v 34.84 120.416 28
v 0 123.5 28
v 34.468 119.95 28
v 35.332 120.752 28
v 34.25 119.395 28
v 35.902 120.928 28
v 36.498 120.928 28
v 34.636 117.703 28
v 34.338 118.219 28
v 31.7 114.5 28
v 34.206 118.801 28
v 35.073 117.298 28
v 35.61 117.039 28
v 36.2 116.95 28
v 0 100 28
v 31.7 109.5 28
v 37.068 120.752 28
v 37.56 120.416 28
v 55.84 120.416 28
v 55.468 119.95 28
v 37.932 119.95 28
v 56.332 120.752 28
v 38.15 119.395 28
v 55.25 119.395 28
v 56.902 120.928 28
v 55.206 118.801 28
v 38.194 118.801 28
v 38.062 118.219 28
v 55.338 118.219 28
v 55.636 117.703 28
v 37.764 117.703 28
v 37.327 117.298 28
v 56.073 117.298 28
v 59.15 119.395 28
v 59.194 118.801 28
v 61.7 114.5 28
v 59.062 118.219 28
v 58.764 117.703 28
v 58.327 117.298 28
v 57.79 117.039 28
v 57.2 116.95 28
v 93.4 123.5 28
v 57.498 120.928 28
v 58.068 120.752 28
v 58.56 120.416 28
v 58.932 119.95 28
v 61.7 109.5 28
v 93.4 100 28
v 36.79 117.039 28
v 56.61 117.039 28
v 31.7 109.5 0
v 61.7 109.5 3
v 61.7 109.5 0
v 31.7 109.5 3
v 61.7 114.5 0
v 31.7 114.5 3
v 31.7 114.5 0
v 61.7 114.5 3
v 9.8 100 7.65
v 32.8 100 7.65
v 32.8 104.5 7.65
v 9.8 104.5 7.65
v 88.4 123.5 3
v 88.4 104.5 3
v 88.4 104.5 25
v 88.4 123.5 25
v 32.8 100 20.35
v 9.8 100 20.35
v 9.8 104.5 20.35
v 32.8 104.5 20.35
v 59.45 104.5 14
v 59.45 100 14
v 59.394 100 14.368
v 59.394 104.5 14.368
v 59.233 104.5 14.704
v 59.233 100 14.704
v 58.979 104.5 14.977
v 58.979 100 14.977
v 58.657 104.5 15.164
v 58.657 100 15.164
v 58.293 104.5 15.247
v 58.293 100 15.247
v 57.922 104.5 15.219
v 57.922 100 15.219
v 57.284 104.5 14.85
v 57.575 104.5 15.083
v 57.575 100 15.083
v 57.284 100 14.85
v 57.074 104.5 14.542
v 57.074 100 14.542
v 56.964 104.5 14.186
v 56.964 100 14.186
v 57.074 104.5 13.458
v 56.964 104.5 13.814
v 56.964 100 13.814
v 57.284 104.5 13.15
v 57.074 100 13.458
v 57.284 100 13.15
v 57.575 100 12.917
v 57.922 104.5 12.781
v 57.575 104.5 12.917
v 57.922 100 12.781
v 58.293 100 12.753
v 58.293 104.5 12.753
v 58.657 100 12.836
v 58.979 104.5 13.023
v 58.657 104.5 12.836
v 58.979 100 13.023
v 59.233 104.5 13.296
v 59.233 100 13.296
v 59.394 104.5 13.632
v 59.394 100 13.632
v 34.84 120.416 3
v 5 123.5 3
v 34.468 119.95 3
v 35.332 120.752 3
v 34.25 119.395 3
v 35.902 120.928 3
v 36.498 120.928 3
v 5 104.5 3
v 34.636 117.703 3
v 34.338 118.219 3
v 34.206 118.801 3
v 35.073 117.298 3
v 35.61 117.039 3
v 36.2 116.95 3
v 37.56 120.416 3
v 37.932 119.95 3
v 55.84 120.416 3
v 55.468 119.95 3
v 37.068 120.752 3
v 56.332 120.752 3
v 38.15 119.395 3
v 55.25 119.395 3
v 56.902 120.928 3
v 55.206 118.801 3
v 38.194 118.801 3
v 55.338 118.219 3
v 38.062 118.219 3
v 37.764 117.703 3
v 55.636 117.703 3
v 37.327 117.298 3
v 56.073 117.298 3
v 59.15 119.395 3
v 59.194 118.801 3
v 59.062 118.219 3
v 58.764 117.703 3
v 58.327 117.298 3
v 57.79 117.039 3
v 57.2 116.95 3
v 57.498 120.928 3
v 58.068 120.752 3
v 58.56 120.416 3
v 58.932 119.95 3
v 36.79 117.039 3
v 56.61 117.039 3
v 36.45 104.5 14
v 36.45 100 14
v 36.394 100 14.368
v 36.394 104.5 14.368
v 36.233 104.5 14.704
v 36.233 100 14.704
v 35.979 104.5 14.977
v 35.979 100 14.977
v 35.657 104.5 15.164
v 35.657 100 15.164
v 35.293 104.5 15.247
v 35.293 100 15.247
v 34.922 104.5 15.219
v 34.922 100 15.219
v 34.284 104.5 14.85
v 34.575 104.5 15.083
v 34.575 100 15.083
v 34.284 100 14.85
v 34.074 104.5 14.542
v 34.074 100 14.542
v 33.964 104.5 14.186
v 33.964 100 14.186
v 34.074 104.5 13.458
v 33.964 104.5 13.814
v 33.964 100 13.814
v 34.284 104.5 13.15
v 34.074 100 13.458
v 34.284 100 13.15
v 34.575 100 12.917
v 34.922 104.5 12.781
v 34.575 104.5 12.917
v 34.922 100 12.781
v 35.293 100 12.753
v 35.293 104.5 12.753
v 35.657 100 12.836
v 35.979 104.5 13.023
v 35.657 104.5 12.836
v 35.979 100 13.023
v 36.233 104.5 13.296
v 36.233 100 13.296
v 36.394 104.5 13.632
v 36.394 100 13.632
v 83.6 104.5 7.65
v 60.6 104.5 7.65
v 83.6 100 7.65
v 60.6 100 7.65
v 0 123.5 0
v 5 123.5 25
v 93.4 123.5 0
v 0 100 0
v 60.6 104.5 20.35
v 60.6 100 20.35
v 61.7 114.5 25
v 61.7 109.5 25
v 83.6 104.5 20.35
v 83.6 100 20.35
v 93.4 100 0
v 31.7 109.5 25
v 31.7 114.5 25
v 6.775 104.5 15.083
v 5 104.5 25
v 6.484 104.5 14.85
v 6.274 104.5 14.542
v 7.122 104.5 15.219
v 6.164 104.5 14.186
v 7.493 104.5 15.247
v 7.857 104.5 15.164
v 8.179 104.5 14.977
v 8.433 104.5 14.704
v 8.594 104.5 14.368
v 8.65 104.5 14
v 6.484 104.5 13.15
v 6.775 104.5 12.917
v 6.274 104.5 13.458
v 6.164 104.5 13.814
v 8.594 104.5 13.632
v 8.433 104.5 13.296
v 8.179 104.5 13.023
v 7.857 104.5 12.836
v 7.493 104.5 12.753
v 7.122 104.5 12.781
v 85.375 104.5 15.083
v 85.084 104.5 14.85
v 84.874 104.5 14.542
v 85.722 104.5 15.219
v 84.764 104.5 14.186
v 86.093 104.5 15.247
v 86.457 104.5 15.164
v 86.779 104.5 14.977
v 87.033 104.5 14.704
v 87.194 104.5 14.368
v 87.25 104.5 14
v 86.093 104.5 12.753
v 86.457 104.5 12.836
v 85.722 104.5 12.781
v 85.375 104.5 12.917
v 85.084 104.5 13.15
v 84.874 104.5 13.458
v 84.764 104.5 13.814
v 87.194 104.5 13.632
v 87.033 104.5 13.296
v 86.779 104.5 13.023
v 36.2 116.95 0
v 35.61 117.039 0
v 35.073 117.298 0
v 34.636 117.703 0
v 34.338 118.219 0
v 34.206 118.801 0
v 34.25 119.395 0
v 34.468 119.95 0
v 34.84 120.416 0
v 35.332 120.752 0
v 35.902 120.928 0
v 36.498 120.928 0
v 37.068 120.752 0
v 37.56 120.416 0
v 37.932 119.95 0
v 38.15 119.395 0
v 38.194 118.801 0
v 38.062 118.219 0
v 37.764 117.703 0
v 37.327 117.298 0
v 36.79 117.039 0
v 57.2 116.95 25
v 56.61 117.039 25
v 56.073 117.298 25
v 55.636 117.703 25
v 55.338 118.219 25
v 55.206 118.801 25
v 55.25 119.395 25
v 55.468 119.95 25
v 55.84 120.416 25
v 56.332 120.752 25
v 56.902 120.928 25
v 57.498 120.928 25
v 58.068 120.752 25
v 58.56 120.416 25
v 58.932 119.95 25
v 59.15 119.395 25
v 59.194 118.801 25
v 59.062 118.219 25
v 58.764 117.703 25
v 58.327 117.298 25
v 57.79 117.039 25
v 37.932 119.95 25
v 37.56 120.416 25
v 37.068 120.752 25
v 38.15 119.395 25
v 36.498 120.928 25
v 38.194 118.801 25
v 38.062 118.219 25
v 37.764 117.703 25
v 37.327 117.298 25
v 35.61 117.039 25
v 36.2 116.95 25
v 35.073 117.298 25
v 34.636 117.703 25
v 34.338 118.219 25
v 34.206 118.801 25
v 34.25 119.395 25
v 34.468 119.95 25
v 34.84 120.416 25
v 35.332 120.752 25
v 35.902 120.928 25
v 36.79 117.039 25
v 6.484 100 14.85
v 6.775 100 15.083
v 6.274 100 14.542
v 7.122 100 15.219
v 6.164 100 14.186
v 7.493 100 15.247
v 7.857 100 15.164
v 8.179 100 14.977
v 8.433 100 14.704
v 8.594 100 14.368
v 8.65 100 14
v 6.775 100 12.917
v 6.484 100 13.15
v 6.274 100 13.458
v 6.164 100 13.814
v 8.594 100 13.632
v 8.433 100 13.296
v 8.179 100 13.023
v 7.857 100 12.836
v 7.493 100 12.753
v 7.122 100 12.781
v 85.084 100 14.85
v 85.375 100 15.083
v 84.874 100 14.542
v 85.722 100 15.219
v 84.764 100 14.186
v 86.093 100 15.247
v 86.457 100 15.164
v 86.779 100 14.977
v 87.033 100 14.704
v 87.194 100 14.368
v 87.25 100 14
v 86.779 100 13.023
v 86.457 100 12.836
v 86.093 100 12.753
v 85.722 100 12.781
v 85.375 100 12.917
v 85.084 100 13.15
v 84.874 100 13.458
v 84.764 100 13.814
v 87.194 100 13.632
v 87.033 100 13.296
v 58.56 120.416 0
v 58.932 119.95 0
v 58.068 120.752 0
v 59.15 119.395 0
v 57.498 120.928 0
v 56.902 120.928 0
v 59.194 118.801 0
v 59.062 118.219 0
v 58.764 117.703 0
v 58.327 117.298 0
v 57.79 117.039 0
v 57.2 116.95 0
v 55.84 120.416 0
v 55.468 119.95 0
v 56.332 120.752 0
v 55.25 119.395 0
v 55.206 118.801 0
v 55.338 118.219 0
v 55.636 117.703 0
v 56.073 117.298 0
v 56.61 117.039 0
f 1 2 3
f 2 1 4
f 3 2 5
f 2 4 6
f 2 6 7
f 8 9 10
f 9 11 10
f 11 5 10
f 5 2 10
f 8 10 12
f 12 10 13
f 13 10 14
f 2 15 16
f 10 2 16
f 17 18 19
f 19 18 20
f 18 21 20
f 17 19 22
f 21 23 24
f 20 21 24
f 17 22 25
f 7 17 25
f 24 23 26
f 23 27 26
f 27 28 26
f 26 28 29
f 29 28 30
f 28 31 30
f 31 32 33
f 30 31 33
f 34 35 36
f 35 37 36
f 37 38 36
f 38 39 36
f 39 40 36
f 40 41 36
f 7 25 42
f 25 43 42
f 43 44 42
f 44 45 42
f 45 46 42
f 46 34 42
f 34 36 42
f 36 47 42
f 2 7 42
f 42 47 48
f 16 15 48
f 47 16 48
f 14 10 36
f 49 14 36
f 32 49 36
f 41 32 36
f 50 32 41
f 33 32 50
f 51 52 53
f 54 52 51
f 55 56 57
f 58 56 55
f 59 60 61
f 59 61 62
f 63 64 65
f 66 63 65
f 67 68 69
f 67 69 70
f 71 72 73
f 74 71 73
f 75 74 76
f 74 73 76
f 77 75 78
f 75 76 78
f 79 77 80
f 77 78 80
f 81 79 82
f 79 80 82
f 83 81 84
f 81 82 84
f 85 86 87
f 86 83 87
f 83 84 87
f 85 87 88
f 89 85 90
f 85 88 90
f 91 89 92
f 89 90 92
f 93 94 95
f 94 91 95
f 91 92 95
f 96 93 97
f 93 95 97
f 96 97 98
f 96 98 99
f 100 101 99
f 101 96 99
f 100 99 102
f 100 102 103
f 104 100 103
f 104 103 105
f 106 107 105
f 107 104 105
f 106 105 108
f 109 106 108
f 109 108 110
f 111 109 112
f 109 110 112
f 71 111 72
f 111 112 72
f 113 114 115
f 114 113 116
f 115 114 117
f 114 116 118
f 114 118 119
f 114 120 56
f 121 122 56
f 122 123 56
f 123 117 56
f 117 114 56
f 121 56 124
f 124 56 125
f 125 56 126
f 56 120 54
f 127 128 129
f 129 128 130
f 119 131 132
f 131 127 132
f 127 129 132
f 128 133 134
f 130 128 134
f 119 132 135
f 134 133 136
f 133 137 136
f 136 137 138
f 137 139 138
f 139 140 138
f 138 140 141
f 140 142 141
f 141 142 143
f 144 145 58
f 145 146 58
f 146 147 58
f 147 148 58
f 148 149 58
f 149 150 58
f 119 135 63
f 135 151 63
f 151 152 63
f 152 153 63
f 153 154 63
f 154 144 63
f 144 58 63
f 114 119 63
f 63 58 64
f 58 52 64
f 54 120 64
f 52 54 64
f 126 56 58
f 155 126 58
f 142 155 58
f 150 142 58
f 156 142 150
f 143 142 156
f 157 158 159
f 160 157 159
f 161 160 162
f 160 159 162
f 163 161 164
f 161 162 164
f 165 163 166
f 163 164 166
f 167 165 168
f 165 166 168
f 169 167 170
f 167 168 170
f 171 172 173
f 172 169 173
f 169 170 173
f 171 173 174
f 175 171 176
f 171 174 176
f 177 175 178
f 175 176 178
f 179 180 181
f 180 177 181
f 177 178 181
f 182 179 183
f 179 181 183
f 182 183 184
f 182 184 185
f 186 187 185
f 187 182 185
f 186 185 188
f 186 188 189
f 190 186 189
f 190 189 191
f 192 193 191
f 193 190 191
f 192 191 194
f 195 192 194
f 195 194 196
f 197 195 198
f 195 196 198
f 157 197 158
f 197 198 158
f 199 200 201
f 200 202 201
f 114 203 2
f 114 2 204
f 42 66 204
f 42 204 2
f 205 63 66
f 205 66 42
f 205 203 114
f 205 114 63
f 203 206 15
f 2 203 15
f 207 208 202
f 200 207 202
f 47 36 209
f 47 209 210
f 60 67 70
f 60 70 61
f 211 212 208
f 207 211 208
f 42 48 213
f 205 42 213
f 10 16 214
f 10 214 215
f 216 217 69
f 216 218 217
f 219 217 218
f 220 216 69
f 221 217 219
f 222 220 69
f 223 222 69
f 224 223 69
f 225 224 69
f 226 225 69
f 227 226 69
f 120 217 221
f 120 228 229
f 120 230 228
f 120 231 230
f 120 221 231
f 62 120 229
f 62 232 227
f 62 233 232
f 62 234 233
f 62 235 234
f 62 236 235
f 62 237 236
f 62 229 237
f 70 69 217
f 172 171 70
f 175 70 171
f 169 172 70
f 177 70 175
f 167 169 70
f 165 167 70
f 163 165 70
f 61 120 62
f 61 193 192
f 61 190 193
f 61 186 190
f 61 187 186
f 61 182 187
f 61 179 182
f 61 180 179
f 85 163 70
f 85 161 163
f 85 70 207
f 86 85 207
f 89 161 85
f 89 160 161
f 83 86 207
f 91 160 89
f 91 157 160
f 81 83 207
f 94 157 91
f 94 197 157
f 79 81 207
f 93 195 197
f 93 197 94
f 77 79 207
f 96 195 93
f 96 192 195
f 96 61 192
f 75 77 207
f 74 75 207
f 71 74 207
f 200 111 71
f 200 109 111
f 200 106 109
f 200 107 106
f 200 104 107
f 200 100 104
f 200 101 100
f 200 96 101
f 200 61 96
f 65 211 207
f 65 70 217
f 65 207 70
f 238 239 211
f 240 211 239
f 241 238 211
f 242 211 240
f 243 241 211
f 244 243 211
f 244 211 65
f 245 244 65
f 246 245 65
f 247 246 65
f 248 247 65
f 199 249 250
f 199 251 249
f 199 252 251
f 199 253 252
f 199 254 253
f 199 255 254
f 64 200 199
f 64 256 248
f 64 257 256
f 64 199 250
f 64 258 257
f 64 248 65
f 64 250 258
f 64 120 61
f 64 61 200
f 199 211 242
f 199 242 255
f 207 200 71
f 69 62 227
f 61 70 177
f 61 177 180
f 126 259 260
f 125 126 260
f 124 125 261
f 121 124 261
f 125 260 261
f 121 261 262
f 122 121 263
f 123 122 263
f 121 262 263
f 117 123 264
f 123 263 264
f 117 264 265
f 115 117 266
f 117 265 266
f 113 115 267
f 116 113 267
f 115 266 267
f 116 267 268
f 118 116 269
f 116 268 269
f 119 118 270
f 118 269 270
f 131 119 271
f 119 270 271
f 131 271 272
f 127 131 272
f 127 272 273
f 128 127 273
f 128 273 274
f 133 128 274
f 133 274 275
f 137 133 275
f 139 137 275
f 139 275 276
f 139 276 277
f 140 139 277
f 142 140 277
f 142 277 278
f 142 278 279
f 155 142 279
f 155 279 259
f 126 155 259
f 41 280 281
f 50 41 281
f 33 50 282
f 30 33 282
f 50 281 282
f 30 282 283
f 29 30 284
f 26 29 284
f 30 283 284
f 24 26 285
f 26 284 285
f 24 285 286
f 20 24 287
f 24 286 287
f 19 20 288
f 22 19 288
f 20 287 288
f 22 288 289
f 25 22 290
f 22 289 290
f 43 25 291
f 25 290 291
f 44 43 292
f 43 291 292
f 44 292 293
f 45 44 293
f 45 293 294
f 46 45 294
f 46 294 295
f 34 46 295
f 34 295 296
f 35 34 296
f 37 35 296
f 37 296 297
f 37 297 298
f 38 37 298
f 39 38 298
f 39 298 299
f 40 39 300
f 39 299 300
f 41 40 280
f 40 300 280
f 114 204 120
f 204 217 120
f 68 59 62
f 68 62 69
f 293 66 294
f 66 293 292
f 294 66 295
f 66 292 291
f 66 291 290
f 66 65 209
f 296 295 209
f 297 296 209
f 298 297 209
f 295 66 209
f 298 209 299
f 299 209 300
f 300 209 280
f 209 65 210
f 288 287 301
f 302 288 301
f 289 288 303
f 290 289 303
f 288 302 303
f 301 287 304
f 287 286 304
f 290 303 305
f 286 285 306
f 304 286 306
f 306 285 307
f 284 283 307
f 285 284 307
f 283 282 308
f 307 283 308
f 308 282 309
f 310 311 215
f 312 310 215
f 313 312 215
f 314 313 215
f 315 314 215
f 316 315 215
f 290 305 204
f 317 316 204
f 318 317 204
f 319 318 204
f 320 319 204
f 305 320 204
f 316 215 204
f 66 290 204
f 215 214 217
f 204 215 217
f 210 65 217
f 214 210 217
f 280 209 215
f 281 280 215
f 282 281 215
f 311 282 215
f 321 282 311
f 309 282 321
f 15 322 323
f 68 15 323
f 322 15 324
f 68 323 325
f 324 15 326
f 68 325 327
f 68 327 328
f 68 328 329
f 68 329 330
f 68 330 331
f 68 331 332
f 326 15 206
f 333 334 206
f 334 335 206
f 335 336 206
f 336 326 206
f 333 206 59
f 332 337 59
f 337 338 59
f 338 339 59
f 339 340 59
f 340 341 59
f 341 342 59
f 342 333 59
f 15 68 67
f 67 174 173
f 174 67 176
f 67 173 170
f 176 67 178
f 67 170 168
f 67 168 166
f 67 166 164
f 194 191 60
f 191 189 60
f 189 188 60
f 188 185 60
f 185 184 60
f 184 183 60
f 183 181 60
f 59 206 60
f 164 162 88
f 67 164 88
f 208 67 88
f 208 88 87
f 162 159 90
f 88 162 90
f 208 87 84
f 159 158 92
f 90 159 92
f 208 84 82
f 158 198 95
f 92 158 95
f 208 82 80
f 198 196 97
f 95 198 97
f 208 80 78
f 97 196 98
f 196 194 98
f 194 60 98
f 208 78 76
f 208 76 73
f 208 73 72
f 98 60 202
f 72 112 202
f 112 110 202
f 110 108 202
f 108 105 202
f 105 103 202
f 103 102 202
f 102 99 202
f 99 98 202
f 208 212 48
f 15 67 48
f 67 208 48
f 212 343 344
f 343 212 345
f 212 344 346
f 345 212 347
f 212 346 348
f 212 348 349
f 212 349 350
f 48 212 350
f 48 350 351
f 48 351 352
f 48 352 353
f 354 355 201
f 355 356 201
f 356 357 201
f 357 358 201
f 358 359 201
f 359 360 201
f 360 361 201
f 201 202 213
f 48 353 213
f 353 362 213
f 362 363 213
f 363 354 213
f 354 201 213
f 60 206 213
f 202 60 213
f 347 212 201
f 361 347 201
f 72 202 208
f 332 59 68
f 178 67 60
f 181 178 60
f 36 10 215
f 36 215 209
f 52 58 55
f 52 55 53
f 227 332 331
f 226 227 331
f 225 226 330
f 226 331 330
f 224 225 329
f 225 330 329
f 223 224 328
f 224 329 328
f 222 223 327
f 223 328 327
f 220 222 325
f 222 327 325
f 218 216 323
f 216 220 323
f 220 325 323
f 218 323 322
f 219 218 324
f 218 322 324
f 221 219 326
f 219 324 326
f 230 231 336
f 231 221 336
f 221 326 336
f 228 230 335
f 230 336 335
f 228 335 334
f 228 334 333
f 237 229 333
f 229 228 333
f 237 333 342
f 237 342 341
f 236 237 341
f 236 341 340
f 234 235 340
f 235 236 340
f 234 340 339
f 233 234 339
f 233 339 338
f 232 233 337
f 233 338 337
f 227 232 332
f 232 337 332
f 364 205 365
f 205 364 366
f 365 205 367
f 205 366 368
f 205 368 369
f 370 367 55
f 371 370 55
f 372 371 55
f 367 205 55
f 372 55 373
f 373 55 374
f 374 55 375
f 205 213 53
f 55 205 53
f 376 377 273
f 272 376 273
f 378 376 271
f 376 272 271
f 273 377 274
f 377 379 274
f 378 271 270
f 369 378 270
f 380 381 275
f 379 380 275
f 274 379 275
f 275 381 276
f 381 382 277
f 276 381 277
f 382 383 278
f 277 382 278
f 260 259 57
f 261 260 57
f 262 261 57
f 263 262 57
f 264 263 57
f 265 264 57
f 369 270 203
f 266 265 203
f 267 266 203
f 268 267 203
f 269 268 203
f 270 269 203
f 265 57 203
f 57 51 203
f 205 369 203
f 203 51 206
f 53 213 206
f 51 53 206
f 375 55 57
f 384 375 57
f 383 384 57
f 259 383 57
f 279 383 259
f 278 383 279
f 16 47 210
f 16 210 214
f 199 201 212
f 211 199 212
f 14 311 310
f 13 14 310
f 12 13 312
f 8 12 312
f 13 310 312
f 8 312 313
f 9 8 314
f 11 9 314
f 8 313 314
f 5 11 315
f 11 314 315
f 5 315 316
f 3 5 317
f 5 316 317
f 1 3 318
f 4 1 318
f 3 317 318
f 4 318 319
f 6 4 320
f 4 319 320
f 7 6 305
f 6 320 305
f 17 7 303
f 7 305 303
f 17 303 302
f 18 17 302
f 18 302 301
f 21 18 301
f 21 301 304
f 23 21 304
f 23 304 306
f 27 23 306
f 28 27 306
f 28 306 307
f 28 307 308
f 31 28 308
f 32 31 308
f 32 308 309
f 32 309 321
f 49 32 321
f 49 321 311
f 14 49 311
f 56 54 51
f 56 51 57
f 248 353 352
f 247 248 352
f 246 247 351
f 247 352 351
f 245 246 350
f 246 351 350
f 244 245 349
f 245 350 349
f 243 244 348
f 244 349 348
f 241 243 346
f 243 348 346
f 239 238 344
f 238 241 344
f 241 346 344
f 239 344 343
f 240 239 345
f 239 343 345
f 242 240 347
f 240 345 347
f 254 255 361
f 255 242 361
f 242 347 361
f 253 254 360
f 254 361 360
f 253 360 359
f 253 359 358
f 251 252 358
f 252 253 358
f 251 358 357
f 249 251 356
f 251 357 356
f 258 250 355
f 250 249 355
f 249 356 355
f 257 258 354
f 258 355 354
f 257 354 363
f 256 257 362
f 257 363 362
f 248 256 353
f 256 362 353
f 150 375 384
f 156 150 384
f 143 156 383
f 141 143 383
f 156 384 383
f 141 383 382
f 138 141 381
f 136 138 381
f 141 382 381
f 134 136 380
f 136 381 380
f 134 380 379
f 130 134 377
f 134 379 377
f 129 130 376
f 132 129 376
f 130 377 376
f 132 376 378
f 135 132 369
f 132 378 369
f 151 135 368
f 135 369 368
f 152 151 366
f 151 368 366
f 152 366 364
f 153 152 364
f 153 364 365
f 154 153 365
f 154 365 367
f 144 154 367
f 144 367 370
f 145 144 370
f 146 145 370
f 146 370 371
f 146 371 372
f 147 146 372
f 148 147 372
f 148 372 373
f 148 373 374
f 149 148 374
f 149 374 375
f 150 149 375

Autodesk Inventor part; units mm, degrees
ref_plane "YZ Plane" through (0, 0, 0) normal (1, 0, 0) x (0, 1, 0)
ref_plane "XZ Plane" through (0, 0, 0) normal (0, 1, 0) x (-1, 0, 0)
ref_plane "XY Plane" through (0, 0, 0) normal (0, 0, 1) x (1, 0, 0)
sketch "Sketch1" plane through (0, 0, 0) normal (0, 0, 1) x (1, 0, 0)
  line L0 (0, 0) -> (93.4, 0)
  line L1 (93.4, 0) -> (93.4, 100)
  line L2 (93.4, 100) -> (0, 100)
  line L3 (0, 100) -> (0, 0)
  dimension "d0" = 93.4
  dimension "d1" = 100
extrude "Extrusion1" add sketch "Sketch1" along normal blind 3
sketch "Sketch2" plane through (0, 100, 0) normal (0, 1, 0) x (1, 0, 0)
  line L0 (0, 0) -> (0, -3) projected
  line L1 (0, 0) -> (93.4, 0)
  line L2 (93.4, 0) -> (93.4, -28)
  line L3 (93.4, -28) -> (0, -28)
  line L4 (0, -28) -> (0, 0)
  line L5 (93.4, 0) -> (0, 0) projected
  line L6 (0, 0) -> (0, -3) projected
  line L7 (93.4, -3) -> (0, -3) projected
  line L8 (93.4, 0) -> (93.4, -3) projected
  line L9 (93.4, -3) -> (0, -3) projected
  line L10 (83.6, -20.35) -> (60.6, -20.35)
  line L11 (60.6, -20.35) -> (60.6, -7.65)
  line L12 (60.6, -7.65) -> (83.6, -7.65)
  line L13 (83.6, -7.65) -> (83.6, -20.35)
  line L14 (32.8, -7.65) -> (9.8, -7.65)
  line L15 (9.8, -7.65) -> (9.8, -20.35)
  line L16 (9.8, -20.35) -> (32.8, -20.35)
  line L17 (32.8, -20.35) -> (32.8, -7.65)
  arc A0 (86.9526, -8.8) -> (86.9526, -9.9) centre (86, -9.35) ccw projected
  arc A1 (57.2474, -9.9) -> (57.2474, -8.8) centre (58.2, -9.35) ccw projected
  arc A2 (36.1526, -8.8) -> (36.1526, -9.9) centre (35.2, -9.35) ccw projected
  arc A3 (6.4474, -9.9) -> (6.4474, -8.8) centre (7.4, -9.35) ccw projected
  circle A4 centre (7.4, -14) radius 1.25
  circle A5 centre (35.2, -14) radius 1.25
  circle A6 centre (58.2, -14) radius 1.25
  circle A7 centre (86, -14) radius 1.25
  point P0 (9.8, -3)
  point P1 (32.8, -3)
  point P2 (60.6, -3)
  point P3 (83.6, -3)
  point P4 (32.8, -14)
  dimension "d4" = 3
  dimension "d6" = 9.8
  dimension "d7" = 7.65
  dimension "d8" = 23
  dimension "d9" = 9.8
  dimension "d13" = 12.7
  dimension "d14" = 28
  dimension "d15" = 7.65
  dimension "d16" = 2.5
extrude "Extrusion2" add sketch "Sketch2" along normal blind 4.5
sketch "Sketch3" plane through (0, 104.5, 0) normal (0, 1, 0) x (1, 0, 0)
  line L0 (93.4, -28) -> (93.4, 0) projected
  line L1 (93.4, 0) -> (0, 0) projected
  line L2 (0, 0) -> (0, -28) projected
  line L3 (0, -28) -> (93.4, -28) projected
  circle A0 centre (86, -14) radius 1.25 projected
  circle A1 centre (7.4, -14) radius 1.25 projected
  circle A2 centre (35.2, -14) radius 1.25 projected
  circle A3 centre (58.2, -14) radius 1.25 projected
  line L4 (32.8, -7.65) -> (32.8, -20.35) projected
  line L5 (32.8, -20.35) -> (9.8, -20.35) projected
  line L6 (9.8, -20.35) -> (9.8, -7.65) projected
  line L7 (9.8, -7.65) -> (32.8, -7.65) projected
  line L8 (83.6, -20.35) -> (60.6, -20.35) projected
  line L9 (60.6, -20.35) -> (60.6, -7.65) projected
  line L10 (60.6, -7.65) -> (83.6, -7.65) projected
  line L11 (83.6, -7.65) -> (83.6, -20.35) projected
  line L12 (88.4, -25) -> (5, -25)
  line L13 (5, -25) -> (5, -3)
  line L14 (5, -3) -> (88.4, -3)
  line L15 (88.4, -3) -> (88.4, -25)
  point P0 (88.4, -14)
  point P1 (93.4, -14)
  dimension "d17" = 5
  dimension "d18" = 5
  dimension "d19" = 22
extrude "Extrusion3" add sketch "Sketch3" along normal blind 19 contours L3 L2 L1 L0
sketch "Sketch4" plane through (0, 100, 28) normal (0, 0, 1) x (1, 0, 0)
  line L0 (0, 0) -> (93.4, 0) projected
  line L1 (93.4, 0) -> (93.4, 23.5) projected
  line L2 (0, 23.5) -> (93.4, 23.5) projected
  line L3 (0, 0) -> (0, 23.5) projected
  point P0 (0, -100)
  point P1 (36.2, 18.95)
  point P2 (46.7, 23.5)
  point P3 (57.2, 18.95)
  dimension "d23" = 36.2
  dimension "d24" = 36.2
  dimension "d25" = 4.55
hole "Hole1" at (36.2, 118.95, 28) at (57.2, 118.95, 28) direction (0, 0, -1) diameter 4 end through all
sketch "Sketch5" plane through (0, 100, 28) normal (0, 0, 1) x (1, 0, 0)
  circle A0 centre (36.2, 18.95) radius 2 projected
  circle A1 centre (57.2, 18.95) radius 2 projected
  line L0 (0, 0) -> (93.4, 0) projected
  line L1 (93.4, 0) -> (93.4, 23.5) projected
  line L2 (0, 23.5) -> (93.4, 23.5) projected
  line L3 (0, 0) -> (0, 23.5) projected
  line L4 (61.7, 9.5) -> (31.7, 9.5)
  line L5 (31.7, 9.5) -> (31.7, 14.5)
  line L6 (31.7, 14.5) -> (61.7, 14.5)
  line L7 (61.7, 14.5) -> (61.7, 9.5)
  point P0 (0, -100)
  point P1 (46.7, 14.5)
  point P2 (46.7, 23.5)
  dimension "d33" = 9
  dimension "d34" = 14
  dimension "d35" = 30
extrude "Extrusion4" cut sketch "Sketch5" against normal through all contours L4 L5 L6 L7
sketch "Sketch6" plane through (0, 0, 3) normal (0, 0, 1) x (1, 0, 0)
  line L0 (93.4, 0) -> (93.4, 100) projected
  line L1 (93.4, 100) -> (0, 100) projected
  line L2 (0, 100) -> (0, 0) projected
  line L3 (0, 0) -> (93.4, 0) projected
extrude "Extrusion5" cut sketch "Sketch6" against normal blind 10
equation "\"d7\" = d15"
equation "\"d9\" = d6"
equation "\"d18\" = d17"
equation "\"d24\" = d23"
properties part number "Frame"
